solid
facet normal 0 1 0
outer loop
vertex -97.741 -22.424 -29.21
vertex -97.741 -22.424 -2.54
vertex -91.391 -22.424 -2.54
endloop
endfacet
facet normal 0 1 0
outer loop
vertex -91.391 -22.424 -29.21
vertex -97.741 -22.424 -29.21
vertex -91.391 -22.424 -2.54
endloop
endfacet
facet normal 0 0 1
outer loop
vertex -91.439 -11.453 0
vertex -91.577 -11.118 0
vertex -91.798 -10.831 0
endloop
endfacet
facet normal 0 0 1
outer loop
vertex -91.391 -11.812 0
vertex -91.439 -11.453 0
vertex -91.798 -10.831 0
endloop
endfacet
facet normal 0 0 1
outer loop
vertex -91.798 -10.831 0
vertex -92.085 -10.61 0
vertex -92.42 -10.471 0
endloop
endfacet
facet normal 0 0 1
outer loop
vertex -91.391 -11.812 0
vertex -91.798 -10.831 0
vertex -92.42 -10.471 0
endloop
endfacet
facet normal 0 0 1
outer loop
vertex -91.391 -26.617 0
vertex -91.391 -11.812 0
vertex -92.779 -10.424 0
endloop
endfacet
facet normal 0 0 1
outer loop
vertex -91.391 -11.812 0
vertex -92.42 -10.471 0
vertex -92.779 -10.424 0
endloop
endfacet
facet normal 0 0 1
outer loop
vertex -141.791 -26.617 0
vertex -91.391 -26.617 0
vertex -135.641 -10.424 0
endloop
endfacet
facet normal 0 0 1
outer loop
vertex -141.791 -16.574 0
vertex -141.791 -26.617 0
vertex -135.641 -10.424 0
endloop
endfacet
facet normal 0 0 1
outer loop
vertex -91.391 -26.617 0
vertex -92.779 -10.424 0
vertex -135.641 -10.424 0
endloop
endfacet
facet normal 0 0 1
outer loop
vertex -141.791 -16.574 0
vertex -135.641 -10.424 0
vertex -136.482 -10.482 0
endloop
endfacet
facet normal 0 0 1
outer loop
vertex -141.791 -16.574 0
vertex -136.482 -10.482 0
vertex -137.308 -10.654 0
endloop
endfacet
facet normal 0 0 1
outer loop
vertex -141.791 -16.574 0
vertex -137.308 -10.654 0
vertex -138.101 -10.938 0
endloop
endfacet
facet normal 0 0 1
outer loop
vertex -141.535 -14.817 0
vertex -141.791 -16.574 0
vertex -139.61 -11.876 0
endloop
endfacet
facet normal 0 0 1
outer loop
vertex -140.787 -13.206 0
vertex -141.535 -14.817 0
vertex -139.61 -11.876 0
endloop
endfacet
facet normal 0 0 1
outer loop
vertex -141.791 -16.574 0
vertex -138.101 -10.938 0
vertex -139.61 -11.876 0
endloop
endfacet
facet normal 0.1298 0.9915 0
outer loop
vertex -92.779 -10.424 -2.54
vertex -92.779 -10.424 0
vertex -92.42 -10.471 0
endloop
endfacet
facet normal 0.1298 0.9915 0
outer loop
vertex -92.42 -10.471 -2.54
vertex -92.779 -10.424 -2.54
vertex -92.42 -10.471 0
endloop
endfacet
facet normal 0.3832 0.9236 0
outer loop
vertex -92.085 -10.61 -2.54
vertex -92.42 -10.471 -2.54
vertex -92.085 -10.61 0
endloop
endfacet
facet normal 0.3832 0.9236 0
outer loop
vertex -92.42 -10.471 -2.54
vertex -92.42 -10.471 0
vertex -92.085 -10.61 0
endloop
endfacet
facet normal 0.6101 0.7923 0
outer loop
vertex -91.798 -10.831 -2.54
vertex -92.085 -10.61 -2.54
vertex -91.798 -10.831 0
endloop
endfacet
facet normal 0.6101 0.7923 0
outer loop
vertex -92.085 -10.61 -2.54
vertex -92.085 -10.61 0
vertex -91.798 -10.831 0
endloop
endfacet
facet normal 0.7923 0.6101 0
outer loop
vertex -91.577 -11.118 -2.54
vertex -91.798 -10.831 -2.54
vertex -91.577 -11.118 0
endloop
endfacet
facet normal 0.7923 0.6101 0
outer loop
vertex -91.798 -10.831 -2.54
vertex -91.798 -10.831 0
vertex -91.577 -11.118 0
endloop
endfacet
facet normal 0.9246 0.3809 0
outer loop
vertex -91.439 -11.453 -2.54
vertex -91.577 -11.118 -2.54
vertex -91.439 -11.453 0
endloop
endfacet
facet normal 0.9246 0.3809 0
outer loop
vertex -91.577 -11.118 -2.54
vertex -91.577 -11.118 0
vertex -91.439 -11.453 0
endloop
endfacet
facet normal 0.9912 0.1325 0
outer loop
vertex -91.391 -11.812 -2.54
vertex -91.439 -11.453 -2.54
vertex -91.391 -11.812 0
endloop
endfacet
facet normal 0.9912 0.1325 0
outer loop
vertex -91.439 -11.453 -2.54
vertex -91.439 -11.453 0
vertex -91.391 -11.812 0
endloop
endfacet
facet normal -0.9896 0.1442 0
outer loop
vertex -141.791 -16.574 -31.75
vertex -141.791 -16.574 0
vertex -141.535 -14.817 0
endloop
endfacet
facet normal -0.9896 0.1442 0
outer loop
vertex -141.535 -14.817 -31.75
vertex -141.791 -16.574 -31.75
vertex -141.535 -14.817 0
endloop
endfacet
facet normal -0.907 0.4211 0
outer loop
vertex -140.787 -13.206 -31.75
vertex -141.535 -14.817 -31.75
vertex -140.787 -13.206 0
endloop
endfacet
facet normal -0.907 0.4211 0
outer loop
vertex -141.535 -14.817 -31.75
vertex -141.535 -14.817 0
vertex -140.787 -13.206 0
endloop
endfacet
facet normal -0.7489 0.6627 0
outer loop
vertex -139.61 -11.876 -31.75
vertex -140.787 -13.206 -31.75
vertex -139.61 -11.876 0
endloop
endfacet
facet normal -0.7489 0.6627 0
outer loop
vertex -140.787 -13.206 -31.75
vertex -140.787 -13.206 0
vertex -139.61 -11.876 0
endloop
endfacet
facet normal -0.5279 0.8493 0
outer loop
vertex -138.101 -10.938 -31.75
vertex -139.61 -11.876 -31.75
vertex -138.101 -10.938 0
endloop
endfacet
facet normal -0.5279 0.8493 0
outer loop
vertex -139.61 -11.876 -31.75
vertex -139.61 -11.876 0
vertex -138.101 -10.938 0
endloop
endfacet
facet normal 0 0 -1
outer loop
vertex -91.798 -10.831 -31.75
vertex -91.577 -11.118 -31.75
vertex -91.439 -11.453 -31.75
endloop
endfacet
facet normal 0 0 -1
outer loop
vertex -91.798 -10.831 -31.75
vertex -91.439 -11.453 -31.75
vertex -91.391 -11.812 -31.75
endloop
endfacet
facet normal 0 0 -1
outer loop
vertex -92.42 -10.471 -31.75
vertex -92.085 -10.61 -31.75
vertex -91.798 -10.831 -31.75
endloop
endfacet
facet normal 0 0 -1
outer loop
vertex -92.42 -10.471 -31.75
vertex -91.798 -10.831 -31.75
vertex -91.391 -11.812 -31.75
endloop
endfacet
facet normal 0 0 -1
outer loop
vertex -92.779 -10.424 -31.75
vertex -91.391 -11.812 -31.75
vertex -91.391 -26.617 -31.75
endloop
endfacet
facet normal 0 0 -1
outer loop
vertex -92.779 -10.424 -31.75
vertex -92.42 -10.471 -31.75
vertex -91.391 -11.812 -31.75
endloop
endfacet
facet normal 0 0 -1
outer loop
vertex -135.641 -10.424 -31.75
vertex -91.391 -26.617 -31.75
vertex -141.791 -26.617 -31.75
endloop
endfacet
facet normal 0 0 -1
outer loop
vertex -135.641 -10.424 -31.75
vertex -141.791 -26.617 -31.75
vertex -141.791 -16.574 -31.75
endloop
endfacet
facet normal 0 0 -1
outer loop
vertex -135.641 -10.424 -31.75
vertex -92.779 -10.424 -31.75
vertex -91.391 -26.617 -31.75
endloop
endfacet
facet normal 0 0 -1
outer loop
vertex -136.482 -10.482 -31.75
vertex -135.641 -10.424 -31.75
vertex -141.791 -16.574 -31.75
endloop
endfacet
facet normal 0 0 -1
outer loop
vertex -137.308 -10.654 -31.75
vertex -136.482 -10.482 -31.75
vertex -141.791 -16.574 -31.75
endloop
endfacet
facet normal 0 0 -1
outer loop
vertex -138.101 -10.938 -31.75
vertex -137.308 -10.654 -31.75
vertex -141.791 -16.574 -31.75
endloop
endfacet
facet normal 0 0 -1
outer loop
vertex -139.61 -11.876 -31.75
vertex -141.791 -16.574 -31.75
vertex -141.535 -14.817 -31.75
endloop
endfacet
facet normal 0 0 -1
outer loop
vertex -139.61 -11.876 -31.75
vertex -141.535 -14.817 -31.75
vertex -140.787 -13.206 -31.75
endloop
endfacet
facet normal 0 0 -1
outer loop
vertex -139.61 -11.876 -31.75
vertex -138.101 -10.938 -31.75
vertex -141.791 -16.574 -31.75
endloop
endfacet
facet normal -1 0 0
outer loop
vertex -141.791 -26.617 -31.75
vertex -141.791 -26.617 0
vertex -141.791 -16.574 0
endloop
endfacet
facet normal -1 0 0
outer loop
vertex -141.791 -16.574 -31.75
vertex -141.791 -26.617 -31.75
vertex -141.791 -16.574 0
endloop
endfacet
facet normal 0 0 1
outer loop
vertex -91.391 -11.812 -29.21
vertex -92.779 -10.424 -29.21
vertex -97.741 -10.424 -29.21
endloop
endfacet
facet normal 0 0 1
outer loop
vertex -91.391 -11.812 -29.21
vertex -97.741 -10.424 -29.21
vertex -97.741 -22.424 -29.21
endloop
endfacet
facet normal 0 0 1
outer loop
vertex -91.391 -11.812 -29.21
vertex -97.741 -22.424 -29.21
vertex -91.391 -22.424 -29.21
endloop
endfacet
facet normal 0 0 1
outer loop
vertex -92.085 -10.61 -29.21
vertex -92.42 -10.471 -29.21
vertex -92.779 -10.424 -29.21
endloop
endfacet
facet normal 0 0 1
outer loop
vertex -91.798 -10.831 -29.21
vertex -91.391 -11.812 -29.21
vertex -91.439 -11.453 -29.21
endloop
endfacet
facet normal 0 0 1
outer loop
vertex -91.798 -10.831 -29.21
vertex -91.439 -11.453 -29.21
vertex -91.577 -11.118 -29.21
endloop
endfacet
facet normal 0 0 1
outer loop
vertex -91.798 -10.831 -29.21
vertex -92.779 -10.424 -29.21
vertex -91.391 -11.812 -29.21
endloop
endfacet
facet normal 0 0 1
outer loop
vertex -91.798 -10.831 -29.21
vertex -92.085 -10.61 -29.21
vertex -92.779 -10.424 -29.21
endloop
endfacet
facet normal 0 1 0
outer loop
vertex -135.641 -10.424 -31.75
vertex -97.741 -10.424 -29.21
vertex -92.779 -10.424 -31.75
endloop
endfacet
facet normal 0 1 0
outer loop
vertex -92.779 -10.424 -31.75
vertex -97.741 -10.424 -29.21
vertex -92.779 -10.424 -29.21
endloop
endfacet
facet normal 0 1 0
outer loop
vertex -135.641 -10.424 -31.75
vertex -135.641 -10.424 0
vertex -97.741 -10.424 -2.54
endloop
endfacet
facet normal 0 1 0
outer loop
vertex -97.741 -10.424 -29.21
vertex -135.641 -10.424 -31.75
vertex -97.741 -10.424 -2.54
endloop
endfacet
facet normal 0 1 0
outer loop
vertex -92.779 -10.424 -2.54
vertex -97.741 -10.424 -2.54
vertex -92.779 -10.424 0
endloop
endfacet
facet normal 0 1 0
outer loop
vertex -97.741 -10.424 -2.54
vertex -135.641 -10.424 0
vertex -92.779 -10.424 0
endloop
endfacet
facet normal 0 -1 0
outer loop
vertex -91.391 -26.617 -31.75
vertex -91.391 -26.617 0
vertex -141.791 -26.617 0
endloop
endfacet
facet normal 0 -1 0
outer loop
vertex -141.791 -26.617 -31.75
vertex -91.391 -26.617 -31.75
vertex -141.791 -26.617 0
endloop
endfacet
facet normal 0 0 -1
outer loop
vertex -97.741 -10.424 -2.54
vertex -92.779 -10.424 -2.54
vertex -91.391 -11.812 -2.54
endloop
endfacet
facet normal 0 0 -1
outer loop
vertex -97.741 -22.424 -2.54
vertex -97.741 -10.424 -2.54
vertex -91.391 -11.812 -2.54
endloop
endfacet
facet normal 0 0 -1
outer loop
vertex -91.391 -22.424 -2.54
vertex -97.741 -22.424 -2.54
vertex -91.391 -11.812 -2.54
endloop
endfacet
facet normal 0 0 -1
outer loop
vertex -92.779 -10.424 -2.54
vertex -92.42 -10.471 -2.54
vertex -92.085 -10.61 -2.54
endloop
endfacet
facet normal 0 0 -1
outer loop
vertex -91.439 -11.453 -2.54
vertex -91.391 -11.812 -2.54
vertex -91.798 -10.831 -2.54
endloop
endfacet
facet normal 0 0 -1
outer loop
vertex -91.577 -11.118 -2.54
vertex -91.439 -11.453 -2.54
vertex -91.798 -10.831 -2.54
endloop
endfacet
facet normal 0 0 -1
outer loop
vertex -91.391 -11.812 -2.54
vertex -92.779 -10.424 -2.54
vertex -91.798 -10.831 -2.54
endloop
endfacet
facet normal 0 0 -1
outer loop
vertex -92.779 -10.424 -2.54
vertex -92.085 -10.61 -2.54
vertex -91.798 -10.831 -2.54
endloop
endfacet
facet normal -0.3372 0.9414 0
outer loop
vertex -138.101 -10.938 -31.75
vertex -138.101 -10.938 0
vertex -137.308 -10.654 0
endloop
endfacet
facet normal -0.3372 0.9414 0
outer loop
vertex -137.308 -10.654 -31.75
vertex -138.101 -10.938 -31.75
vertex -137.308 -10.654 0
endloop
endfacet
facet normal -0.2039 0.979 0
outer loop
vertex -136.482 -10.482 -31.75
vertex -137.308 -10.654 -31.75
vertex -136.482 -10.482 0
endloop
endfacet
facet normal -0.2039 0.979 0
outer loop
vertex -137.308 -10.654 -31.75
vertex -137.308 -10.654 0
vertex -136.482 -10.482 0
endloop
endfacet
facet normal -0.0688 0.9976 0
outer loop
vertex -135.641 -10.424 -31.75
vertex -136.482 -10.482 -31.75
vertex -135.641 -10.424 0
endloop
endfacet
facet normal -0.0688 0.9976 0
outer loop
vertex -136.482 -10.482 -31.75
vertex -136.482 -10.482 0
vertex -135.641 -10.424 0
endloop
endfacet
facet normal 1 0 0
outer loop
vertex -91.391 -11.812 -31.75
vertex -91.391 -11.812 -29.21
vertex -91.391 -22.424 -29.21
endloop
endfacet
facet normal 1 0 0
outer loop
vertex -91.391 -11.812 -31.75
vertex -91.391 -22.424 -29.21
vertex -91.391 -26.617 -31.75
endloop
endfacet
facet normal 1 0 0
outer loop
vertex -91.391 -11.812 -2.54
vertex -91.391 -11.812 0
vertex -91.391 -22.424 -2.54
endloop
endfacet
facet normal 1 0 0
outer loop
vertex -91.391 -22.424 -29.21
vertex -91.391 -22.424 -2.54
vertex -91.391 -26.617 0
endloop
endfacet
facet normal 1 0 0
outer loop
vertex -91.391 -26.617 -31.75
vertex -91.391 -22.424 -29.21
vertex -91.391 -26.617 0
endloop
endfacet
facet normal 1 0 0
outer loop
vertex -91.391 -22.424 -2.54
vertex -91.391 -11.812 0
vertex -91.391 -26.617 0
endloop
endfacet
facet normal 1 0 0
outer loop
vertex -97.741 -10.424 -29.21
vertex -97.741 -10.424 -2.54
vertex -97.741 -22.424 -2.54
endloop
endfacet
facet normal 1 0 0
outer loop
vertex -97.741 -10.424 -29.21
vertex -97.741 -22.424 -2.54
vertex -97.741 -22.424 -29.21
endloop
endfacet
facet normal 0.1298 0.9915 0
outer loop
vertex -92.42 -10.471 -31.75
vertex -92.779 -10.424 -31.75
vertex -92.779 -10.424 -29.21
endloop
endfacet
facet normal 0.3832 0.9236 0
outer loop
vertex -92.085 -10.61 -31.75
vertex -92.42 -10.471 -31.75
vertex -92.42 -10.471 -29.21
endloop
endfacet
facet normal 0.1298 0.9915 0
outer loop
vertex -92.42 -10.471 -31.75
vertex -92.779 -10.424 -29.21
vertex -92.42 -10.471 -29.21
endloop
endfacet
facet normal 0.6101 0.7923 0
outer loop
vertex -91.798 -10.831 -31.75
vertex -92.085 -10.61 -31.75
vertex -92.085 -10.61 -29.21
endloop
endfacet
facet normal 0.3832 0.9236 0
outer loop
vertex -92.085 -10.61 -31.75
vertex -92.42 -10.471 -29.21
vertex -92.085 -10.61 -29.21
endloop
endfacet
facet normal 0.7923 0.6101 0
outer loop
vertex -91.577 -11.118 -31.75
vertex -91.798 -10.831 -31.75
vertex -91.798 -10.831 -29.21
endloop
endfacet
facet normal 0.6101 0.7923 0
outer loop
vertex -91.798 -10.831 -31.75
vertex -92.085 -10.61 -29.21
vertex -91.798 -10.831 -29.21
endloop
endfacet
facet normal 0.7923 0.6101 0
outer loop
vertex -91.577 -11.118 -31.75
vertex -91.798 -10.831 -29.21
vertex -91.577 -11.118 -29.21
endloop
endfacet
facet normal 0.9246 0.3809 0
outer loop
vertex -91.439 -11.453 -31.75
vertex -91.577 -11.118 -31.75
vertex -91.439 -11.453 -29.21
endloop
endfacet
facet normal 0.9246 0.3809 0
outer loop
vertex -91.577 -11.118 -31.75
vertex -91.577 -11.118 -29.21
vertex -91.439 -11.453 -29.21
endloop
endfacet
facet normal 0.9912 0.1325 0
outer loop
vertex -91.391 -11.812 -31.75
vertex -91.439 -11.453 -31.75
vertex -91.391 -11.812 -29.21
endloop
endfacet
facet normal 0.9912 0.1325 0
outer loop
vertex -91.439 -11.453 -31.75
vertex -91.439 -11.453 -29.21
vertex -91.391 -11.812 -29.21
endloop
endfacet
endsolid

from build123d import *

# Parameters (mm, degrees)
BOSS_EXTRUDE1_DEPTH = 31.75
SCREWHEADNOTCH_W    = 6.35
SCREWHEADNOTCH_H    = 26.67
CUT_EXTRUDE1_DEPTH  = 12


with BuildPart() as part:
    # Sketch1 → Boss-Extrude1 (new body)
    with BuildSketch(Plane.XY):
        with BuildLine():
            Line((-91.391382579, -26.616972455), (-141.791382579, -26.616972455))
            Line((-141.791382579, -26.616972455), (-141.791382579, -16.574195588))
            ThreePointArc((-141.791382579, -16.574195588), (-140.786841742, -13.20570186), (-138.101382579, -10.937627484))
            ThreePointArc((-138.101382579, -10.937627484), (-136.897886888, -10.553921764), (-135.641382579, -10.424195588))
            Line((-135.641382579, -10.424195588), (-92.778882579, -10.424195588))
            ThreePointArc((-92.778882579, -10.424195588), (-91.79777192, -10.83058493), (-91.391382579, -11.811695588))
            Line((-91.391382579, -11.811695588), (-91.391382579, -26.616972455))
        make_face()
    extrude(amount=-BOSS_EXTRUDE1_DEPTH)

    # ScrewHeadNotch → Cut-Extrude1 (cut)
    with BuildSketch(Plane(origin=(0, -10.424195588, 0), x_dir=(1, 0, 0), z_dir=(0, 1, 0))):
        with Locations((-94.566382579, 15.875)):
            Rectangle(SCREWHEADNOTCH_W, SCREWHEADNOTCH_H)
    extrude(amount=-CUT_EXTRUDE1_DEPTH, mode=Mode.SUBTRACT)


solid = part.part
